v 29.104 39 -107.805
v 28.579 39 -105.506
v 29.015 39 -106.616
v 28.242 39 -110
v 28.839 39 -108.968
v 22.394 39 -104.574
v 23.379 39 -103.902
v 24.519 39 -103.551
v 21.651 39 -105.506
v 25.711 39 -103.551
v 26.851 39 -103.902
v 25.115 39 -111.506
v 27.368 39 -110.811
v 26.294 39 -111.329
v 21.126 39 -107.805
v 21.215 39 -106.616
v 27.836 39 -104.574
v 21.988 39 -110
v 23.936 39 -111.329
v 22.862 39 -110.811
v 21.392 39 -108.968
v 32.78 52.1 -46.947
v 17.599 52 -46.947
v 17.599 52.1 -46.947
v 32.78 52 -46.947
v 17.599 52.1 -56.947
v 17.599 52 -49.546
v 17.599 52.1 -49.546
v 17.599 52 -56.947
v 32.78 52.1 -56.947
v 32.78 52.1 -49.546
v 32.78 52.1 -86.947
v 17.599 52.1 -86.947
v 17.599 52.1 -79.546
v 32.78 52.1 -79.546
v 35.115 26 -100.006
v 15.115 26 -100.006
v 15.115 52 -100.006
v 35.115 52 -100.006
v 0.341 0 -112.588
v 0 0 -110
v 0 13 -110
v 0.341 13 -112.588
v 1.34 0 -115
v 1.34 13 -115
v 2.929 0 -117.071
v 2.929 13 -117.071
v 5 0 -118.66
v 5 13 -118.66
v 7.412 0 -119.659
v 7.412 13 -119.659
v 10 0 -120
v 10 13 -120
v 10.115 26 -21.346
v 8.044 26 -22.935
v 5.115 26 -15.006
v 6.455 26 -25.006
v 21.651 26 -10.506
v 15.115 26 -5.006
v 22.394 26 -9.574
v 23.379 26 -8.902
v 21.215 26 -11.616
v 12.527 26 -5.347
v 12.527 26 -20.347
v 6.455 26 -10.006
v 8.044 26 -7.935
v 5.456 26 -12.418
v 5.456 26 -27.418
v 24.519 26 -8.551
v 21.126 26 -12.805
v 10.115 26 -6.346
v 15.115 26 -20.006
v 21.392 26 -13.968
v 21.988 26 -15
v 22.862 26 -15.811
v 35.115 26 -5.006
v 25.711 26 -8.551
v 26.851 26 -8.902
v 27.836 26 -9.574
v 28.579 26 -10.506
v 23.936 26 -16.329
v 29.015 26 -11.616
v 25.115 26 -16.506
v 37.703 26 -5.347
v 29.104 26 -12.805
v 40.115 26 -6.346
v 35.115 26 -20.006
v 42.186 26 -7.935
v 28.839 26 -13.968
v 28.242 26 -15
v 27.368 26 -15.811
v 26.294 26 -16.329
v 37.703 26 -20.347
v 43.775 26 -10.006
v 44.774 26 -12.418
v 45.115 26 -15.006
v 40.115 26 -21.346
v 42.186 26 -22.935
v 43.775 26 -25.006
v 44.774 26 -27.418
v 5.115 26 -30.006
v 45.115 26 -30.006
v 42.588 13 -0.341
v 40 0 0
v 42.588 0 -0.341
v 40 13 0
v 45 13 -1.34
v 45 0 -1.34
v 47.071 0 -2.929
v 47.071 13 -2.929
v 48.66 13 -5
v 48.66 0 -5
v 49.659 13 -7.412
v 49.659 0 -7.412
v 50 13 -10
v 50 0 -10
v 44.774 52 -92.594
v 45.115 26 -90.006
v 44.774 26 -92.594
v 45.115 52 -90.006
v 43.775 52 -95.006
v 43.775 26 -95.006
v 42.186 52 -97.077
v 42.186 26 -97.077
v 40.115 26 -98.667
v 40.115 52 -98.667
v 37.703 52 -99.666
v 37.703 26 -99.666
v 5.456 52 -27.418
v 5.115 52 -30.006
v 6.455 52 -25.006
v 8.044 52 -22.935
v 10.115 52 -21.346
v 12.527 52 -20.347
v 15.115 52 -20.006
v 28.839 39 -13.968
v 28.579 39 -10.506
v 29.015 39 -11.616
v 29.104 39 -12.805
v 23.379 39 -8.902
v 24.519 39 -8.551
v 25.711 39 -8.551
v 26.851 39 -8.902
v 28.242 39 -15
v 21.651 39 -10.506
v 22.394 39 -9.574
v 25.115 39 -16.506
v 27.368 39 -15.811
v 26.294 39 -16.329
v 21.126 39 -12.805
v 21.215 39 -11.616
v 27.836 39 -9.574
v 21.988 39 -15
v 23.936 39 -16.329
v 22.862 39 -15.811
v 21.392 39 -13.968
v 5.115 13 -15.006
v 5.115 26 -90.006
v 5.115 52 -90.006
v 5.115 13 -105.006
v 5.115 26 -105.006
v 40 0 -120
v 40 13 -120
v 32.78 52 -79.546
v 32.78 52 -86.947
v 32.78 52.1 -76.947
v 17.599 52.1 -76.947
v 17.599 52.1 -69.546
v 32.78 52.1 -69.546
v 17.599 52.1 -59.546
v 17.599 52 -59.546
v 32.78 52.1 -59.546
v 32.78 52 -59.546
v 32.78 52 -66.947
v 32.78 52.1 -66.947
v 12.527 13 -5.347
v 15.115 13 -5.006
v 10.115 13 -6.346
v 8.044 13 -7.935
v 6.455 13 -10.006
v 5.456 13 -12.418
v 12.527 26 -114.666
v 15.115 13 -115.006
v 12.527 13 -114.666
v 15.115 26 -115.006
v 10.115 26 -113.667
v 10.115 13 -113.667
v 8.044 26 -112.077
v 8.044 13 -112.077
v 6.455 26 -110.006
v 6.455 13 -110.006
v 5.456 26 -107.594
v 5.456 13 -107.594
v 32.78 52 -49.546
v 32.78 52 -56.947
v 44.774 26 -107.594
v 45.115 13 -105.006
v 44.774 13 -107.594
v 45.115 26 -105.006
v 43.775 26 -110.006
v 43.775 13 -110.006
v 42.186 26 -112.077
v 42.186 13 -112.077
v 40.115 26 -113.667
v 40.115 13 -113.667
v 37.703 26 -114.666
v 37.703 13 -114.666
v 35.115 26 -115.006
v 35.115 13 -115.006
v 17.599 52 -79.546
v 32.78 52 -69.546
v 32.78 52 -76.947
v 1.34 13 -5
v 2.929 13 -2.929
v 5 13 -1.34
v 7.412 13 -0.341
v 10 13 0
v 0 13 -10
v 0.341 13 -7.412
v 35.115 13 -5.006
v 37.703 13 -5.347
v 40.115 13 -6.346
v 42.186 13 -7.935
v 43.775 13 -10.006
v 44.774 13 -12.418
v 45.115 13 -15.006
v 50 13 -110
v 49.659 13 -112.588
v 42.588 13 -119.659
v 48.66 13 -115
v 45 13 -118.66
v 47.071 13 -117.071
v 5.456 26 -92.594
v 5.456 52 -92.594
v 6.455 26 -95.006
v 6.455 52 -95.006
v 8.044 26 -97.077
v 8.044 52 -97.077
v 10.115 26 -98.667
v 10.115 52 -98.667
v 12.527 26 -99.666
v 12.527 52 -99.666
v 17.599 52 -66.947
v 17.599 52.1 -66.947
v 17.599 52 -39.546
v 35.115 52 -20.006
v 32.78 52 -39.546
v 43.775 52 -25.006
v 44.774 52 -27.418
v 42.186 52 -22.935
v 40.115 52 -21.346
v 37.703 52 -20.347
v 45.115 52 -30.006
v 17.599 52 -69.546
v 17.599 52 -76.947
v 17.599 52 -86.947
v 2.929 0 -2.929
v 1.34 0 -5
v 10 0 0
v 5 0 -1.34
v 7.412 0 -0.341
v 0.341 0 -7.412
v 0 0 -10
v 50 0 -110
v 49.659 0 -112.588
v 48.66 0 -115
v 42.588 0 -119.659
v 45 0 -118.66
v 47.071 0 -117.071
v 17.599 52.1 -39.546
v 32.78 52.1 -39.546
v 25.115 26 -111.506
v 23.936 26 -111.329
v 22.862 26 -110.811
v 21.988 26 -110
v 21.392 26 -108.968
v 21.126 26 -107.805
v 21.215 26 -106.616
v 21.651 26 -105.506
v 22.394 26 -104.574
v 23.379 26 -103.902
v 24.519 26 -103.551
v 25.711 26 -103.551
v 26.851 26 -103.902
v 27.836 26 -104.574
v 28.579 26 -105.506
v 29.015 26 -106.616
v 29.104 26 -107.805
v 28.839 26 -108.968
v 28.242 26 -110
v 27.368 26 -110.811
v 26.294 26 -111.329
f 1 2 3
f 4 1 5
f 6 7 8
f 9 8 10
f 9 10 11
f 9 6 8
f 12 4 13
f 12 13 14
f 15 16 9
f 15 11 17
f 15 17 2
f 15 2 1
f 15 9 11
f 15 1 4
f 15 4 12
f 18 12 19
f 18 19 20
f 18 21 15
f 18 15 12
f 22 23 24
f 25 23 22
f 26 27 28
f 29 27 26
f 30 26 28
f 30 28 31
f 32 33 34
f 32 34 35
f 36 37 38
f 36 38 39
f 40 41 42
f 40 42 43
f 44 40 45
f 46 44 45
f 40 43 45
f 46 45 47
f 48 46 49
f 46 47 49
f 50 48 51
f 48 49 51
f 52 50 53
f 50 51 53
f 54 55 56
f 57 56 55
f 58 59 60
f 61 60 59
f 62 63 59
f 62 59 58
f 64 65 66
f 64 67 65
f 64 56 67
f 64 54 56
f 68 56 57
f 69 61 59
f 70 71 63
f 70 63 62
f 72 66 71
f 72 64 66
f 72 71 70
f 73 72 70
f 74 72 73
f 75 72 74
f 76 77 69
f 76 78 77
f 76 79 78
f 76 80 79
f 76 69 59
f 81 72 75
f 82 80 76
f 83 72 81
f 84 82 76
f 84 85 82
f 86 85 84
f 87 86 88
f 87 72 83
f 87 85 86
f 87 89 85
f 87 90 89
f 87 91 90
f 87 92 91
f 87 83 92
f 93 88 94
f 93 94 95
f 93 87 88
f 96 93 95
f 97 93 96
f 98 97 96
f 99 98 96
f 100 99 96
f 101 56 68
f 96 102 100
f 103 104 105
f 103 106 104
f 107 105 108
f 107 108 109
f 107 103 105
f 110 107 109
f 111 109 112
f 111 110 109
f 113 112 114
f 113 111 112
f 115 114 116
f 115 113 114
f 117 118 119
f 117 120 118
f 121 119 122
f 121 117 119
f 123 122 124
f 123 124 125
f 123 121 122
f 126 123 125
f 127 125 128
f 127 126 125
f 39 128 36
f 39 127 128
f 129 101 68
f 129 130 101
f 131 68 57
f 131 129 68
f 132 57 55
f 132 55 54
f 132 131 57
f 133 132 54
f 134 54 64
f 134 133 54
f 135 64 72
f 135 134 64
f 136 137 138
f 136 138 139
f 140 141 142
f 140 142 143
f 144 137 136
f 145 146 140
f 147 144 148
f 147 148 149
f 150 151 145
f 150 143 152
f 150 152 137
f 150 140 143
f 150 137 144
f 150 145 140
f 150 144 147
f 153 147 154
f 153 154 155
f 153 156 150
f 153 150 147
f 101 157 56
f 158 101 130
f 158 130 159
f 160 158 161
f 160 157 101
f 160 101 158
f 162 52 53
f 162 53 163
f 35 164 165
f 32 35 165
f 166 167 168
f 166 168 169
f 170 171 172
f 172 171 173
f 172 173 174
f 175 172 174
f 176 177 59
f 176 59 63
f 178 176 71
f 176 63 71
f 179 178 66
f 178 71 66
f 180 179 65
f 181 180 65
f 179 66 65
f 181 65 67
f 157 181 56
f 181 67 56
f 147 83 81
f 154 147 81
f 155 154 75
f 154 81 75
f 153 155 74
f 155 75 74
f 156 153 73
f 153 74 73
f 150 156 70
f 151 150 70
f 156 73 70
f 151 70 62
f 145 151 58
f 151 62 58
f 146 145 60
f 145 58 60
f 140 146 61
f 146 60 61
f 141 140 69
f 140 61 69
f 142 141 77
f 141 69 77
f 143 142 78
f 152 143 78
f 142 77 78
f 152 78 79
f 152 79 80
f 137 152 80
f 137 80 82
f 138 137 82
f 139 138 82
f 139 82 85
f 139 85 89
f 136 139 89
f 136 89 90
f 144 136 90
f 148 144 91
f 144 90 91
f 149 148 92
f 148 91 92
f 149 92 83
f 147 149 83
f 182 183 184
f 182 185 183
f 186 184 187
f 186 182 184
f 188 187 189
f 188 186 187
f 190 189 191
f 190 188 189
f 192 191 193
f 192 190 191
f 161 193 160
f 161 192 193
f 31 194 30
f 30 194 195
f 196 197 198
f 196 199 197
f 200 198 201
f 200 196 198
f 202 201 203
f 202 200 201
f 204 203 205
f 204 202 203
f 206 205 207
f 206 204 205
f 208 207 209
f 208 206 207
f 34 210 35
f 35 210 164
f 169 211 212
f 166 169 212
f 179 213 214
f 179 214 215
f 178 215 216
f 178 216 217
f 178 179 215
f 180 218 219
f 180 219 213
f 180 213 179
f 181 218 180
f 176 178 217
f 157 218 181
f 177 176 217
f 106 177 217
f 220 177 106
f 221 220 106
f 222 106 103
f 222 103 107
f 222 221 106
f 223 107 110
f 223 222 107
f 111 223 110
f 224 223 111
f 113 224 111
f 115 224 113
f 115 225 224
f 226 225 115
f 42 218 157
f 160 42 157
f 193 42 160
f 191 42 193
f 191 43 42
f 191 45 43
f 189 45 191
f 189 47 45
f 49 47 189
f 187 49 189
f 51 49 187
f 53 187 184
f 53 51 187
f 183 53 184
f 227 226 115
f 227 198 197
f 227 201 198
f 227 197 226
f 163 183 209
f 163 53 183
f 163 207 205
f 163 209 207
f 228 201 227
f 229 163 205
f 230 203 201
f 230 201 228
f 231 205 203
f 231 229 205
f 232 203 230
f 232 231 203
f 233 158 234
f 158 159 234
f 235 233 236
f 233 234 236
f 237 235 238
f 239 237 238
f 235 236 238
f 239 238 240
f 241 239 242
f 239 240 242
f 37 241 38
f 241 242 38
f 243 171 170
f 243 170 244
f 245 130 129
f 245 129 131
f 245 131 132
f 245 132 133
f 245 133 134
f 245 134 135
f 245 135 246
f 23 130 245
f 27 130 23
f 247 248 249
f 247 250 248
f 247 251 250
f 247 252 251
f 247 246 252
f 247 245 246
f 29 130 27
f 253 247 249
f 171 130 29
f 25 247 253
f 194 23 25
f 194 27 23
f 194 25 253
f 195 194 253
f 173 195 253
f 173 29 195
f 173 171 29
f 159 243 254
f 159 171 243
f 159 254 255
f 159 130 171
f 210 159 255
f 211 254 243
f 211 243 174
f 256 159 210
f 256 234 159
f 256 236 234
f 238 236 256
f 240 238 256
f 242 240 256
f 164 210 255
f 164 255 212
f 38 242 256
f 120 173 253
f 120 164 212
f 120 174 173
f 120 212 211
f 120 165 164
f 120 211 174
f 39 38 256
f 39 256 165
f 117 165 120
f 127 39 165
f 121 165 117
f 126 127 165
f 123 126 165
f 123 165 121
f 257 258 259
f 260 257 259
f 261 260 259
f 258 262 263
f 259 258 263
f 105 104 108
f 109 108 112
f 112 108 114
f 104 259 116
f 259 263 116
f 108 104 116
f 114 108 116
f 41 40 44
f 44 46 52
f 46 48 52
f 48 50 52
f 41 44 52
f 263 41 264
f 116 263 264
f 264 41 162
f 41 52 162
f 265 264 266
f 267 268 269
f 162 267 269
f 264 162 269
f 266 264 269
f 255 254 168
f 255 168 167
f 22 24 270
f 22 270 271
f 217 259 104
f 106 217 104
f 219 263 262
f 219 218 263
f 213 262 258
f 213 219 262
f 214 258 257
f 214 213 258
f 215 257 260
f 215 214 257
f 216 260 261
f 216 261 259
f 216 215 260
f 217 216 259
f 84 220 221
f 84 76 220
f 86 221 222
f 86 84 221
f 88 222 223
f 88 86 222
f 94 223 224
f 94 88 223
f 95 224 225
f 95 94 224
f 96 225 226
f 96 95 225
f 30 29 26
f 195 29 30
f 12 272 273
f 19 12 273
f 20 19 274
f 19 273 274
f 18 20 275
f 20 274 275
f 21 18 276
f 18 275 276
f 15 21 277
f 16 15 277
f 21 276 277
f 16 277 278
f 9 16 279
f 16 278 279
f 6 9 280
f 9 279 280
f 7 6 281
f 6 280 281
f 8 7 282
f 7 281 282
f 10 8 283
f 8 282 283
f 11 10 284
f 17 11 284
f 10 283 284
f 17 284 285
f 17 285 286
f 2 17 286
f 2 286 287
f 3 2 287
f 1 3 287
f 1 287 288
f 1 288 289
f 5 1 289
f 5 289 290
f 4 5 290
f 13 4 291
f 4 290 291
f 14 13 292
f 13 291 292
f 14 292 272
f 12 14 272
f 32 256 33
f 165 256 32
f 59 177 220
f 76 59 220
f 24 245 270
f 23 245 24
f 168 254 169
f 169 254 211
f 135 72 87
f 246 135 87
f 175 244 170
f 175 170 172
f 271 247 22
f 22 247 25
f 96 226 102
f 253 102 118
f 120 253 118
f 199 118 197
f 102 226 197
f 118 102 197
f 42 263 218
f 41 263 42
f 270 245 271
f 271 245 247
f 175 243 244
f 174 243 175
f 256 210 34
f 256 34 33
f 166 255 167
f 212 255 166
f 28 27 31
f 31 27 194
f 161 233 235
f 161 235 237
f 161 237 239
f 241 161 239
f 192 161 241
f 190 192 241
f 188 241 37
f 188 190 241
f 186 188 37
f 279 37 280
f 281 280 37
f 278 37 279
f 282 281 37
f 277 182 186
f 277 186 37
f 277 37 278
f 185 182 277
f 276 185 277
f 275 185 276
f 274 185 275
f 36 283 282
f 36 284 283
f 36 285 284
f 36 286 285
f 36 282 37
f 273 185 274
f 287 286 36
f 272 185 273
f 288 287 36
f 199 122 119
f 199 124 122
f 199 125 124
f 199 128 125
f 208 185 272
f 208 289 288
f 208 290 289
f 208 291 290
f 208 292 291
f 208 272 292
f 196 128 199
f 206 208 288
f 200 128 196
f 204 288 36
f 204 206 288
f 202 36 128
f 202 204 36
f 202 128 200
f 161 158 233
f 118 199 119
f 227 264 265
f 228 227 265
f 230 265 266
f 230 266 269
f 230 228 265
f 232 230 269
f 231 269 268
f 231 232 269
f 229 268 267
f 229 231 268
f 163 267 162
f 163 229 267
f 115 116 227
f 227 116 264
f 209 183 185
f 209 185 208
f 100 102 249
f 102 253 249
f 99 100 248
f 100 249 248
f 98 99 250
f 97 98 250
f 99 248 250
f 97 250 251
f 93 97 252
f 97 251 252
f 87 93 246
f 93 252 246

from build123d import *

# Parameters (mm, degrees)
SKETCH1_W           = 50
SKETCH1_H           = 120
BOSS_EXTRUDE1_DEPTH = 13
FILLET1_R           = 10
SKETCH6_W           = 40
SKETCH6_H           = 110
BOSS_EXTRUDE4_DEPTH = 13
SKETCH7_W           = 40
SKETCH7_H           = 80
BOSS_EXTRUDE5_DEPTH = 26
SKETCH8_R           = 4
BOSS_EXTRUDE6_DEPTH = 13
FILLET4_R           = 10
SKETCH9_W           = 15.181145945
SKETCH9_H           = 7.400808648
BOSS_EXTRUDE7_DEPTH = 0.1


with BuildPart() as part:
    # Sketch1 → Boss-Extrude1 (new body)
    with BuildSketch(Plane(origin=(0, 0, 0), x_dir=(1, 0, 0), z_dir=(0, 1, 0))):
        with Locations((25, 60)):
            Rectangle(SKETCH1_W, SKETCH1_H)
    extrude(amount=BOSS_EXTRUDE1_DEPTH)

    # Fillet1
    fillet1_edges = [part.edges().sort_by_distance(p)[0] for p in [
        (0, 6.5, -120),
        (50, 6.5, -120),
        (50, 6.5, 0),
        (0, 6.5, 0),
    ]]
    fillet(fillet1_edges, radius=FILLET1_R)

    # Sketch6 → Boss-Extrude4 (add)
    with BuildSketch(Plane(origin=(0, 13, 0), x_dir=(1, 0, 0), z_dir=(0, 1, 0))):
        with Locations((25.115018377, 60.006298816)):
            Rectangle(SKETCH6_W, SKETCH6_H)
    extrude(amount=BOSS_EXTRUDE4_DEPTH)

    # Sketch7 → Boss-Extrude5 (add)
    with BuildSketch(Plane(origin=(0, 26, 0), x_dir=(1, 0, 0), z_dir=(0, 1, 0))):
        with Locations((25.115018377, 60.006298816)):
            Rectangle(SKETCH7_W, SKETCH7_H)
    extrude(amount=BOSS_EXTRUDE5_DEPTH)

    # Sketch8 → Boss-Extrude6 (add)
    with BuildSketch(Plane(origin=(0, 26, 0), x_dir=(1, 0, 0), z_dir=(0, 1, 0))):
        with Locations(Location((25.115018377, 107.506298816, 0), (0, 0, 90))):
            Circle(SKETCH8_R)
        with Locations(Location((25.115018377, 12.506298816, 0), (0, 0, 90))):
            Circle(SKETCH8_R)
    extrude(amount=BOSS_EXTRUDE6_DEPTH)

    # Fillet4
    fillet4_edges = [part.edges().sort_by_distance(p)[0] for p in [
        (5.115018377, 19.5, -115.006298816),
        (5.115018377, 19.5, -5.006298816),
        (45.115018377, 19.5, -5.006298816),
        (45.115018377, 19.5, -115.006298816),
        (5.115018377, 39, -100.006298816),
        (5.115018377, 39, -20.006298816),
        (45.115018377, 39, -20.006298816),
        (45.115018377, 39, -100.006298816),
    ]]
    fillet(fillet4_edges, radius=FILLET4_R)

    # Sketch9 → Boss-Extrude7 (add)
    with BuildSketch(Plane(origin=(0, 52, 0), x_dir=(1, 0, 0), z_dir=(0, 1, 0))):
        with Locations((25.189764325, 73.246129728)):
            Rectangle(SKETCH9_W, SKETCH9_H)
        with Locations((25.189764325, 83.246129728)):
            Rectangle(SKETCH9_W, SKETCH9_H)
        with Locations((25.189764325, 63.246129728)):
            Rectangle(SKETCH9_W, SKETCH9_H)
        with Locations((25.189764325, 53.246129728)):
            Rectangle(SKETCH9_W, SKETCH9_H)
        with Locations((25.189764325, 43.246129728)):
            Rectangle(SKETCH9_W, SKETCH9_H)
    extrude(amount=BOSS_EXTRUDE7_DEPTH)


solid = part.part
